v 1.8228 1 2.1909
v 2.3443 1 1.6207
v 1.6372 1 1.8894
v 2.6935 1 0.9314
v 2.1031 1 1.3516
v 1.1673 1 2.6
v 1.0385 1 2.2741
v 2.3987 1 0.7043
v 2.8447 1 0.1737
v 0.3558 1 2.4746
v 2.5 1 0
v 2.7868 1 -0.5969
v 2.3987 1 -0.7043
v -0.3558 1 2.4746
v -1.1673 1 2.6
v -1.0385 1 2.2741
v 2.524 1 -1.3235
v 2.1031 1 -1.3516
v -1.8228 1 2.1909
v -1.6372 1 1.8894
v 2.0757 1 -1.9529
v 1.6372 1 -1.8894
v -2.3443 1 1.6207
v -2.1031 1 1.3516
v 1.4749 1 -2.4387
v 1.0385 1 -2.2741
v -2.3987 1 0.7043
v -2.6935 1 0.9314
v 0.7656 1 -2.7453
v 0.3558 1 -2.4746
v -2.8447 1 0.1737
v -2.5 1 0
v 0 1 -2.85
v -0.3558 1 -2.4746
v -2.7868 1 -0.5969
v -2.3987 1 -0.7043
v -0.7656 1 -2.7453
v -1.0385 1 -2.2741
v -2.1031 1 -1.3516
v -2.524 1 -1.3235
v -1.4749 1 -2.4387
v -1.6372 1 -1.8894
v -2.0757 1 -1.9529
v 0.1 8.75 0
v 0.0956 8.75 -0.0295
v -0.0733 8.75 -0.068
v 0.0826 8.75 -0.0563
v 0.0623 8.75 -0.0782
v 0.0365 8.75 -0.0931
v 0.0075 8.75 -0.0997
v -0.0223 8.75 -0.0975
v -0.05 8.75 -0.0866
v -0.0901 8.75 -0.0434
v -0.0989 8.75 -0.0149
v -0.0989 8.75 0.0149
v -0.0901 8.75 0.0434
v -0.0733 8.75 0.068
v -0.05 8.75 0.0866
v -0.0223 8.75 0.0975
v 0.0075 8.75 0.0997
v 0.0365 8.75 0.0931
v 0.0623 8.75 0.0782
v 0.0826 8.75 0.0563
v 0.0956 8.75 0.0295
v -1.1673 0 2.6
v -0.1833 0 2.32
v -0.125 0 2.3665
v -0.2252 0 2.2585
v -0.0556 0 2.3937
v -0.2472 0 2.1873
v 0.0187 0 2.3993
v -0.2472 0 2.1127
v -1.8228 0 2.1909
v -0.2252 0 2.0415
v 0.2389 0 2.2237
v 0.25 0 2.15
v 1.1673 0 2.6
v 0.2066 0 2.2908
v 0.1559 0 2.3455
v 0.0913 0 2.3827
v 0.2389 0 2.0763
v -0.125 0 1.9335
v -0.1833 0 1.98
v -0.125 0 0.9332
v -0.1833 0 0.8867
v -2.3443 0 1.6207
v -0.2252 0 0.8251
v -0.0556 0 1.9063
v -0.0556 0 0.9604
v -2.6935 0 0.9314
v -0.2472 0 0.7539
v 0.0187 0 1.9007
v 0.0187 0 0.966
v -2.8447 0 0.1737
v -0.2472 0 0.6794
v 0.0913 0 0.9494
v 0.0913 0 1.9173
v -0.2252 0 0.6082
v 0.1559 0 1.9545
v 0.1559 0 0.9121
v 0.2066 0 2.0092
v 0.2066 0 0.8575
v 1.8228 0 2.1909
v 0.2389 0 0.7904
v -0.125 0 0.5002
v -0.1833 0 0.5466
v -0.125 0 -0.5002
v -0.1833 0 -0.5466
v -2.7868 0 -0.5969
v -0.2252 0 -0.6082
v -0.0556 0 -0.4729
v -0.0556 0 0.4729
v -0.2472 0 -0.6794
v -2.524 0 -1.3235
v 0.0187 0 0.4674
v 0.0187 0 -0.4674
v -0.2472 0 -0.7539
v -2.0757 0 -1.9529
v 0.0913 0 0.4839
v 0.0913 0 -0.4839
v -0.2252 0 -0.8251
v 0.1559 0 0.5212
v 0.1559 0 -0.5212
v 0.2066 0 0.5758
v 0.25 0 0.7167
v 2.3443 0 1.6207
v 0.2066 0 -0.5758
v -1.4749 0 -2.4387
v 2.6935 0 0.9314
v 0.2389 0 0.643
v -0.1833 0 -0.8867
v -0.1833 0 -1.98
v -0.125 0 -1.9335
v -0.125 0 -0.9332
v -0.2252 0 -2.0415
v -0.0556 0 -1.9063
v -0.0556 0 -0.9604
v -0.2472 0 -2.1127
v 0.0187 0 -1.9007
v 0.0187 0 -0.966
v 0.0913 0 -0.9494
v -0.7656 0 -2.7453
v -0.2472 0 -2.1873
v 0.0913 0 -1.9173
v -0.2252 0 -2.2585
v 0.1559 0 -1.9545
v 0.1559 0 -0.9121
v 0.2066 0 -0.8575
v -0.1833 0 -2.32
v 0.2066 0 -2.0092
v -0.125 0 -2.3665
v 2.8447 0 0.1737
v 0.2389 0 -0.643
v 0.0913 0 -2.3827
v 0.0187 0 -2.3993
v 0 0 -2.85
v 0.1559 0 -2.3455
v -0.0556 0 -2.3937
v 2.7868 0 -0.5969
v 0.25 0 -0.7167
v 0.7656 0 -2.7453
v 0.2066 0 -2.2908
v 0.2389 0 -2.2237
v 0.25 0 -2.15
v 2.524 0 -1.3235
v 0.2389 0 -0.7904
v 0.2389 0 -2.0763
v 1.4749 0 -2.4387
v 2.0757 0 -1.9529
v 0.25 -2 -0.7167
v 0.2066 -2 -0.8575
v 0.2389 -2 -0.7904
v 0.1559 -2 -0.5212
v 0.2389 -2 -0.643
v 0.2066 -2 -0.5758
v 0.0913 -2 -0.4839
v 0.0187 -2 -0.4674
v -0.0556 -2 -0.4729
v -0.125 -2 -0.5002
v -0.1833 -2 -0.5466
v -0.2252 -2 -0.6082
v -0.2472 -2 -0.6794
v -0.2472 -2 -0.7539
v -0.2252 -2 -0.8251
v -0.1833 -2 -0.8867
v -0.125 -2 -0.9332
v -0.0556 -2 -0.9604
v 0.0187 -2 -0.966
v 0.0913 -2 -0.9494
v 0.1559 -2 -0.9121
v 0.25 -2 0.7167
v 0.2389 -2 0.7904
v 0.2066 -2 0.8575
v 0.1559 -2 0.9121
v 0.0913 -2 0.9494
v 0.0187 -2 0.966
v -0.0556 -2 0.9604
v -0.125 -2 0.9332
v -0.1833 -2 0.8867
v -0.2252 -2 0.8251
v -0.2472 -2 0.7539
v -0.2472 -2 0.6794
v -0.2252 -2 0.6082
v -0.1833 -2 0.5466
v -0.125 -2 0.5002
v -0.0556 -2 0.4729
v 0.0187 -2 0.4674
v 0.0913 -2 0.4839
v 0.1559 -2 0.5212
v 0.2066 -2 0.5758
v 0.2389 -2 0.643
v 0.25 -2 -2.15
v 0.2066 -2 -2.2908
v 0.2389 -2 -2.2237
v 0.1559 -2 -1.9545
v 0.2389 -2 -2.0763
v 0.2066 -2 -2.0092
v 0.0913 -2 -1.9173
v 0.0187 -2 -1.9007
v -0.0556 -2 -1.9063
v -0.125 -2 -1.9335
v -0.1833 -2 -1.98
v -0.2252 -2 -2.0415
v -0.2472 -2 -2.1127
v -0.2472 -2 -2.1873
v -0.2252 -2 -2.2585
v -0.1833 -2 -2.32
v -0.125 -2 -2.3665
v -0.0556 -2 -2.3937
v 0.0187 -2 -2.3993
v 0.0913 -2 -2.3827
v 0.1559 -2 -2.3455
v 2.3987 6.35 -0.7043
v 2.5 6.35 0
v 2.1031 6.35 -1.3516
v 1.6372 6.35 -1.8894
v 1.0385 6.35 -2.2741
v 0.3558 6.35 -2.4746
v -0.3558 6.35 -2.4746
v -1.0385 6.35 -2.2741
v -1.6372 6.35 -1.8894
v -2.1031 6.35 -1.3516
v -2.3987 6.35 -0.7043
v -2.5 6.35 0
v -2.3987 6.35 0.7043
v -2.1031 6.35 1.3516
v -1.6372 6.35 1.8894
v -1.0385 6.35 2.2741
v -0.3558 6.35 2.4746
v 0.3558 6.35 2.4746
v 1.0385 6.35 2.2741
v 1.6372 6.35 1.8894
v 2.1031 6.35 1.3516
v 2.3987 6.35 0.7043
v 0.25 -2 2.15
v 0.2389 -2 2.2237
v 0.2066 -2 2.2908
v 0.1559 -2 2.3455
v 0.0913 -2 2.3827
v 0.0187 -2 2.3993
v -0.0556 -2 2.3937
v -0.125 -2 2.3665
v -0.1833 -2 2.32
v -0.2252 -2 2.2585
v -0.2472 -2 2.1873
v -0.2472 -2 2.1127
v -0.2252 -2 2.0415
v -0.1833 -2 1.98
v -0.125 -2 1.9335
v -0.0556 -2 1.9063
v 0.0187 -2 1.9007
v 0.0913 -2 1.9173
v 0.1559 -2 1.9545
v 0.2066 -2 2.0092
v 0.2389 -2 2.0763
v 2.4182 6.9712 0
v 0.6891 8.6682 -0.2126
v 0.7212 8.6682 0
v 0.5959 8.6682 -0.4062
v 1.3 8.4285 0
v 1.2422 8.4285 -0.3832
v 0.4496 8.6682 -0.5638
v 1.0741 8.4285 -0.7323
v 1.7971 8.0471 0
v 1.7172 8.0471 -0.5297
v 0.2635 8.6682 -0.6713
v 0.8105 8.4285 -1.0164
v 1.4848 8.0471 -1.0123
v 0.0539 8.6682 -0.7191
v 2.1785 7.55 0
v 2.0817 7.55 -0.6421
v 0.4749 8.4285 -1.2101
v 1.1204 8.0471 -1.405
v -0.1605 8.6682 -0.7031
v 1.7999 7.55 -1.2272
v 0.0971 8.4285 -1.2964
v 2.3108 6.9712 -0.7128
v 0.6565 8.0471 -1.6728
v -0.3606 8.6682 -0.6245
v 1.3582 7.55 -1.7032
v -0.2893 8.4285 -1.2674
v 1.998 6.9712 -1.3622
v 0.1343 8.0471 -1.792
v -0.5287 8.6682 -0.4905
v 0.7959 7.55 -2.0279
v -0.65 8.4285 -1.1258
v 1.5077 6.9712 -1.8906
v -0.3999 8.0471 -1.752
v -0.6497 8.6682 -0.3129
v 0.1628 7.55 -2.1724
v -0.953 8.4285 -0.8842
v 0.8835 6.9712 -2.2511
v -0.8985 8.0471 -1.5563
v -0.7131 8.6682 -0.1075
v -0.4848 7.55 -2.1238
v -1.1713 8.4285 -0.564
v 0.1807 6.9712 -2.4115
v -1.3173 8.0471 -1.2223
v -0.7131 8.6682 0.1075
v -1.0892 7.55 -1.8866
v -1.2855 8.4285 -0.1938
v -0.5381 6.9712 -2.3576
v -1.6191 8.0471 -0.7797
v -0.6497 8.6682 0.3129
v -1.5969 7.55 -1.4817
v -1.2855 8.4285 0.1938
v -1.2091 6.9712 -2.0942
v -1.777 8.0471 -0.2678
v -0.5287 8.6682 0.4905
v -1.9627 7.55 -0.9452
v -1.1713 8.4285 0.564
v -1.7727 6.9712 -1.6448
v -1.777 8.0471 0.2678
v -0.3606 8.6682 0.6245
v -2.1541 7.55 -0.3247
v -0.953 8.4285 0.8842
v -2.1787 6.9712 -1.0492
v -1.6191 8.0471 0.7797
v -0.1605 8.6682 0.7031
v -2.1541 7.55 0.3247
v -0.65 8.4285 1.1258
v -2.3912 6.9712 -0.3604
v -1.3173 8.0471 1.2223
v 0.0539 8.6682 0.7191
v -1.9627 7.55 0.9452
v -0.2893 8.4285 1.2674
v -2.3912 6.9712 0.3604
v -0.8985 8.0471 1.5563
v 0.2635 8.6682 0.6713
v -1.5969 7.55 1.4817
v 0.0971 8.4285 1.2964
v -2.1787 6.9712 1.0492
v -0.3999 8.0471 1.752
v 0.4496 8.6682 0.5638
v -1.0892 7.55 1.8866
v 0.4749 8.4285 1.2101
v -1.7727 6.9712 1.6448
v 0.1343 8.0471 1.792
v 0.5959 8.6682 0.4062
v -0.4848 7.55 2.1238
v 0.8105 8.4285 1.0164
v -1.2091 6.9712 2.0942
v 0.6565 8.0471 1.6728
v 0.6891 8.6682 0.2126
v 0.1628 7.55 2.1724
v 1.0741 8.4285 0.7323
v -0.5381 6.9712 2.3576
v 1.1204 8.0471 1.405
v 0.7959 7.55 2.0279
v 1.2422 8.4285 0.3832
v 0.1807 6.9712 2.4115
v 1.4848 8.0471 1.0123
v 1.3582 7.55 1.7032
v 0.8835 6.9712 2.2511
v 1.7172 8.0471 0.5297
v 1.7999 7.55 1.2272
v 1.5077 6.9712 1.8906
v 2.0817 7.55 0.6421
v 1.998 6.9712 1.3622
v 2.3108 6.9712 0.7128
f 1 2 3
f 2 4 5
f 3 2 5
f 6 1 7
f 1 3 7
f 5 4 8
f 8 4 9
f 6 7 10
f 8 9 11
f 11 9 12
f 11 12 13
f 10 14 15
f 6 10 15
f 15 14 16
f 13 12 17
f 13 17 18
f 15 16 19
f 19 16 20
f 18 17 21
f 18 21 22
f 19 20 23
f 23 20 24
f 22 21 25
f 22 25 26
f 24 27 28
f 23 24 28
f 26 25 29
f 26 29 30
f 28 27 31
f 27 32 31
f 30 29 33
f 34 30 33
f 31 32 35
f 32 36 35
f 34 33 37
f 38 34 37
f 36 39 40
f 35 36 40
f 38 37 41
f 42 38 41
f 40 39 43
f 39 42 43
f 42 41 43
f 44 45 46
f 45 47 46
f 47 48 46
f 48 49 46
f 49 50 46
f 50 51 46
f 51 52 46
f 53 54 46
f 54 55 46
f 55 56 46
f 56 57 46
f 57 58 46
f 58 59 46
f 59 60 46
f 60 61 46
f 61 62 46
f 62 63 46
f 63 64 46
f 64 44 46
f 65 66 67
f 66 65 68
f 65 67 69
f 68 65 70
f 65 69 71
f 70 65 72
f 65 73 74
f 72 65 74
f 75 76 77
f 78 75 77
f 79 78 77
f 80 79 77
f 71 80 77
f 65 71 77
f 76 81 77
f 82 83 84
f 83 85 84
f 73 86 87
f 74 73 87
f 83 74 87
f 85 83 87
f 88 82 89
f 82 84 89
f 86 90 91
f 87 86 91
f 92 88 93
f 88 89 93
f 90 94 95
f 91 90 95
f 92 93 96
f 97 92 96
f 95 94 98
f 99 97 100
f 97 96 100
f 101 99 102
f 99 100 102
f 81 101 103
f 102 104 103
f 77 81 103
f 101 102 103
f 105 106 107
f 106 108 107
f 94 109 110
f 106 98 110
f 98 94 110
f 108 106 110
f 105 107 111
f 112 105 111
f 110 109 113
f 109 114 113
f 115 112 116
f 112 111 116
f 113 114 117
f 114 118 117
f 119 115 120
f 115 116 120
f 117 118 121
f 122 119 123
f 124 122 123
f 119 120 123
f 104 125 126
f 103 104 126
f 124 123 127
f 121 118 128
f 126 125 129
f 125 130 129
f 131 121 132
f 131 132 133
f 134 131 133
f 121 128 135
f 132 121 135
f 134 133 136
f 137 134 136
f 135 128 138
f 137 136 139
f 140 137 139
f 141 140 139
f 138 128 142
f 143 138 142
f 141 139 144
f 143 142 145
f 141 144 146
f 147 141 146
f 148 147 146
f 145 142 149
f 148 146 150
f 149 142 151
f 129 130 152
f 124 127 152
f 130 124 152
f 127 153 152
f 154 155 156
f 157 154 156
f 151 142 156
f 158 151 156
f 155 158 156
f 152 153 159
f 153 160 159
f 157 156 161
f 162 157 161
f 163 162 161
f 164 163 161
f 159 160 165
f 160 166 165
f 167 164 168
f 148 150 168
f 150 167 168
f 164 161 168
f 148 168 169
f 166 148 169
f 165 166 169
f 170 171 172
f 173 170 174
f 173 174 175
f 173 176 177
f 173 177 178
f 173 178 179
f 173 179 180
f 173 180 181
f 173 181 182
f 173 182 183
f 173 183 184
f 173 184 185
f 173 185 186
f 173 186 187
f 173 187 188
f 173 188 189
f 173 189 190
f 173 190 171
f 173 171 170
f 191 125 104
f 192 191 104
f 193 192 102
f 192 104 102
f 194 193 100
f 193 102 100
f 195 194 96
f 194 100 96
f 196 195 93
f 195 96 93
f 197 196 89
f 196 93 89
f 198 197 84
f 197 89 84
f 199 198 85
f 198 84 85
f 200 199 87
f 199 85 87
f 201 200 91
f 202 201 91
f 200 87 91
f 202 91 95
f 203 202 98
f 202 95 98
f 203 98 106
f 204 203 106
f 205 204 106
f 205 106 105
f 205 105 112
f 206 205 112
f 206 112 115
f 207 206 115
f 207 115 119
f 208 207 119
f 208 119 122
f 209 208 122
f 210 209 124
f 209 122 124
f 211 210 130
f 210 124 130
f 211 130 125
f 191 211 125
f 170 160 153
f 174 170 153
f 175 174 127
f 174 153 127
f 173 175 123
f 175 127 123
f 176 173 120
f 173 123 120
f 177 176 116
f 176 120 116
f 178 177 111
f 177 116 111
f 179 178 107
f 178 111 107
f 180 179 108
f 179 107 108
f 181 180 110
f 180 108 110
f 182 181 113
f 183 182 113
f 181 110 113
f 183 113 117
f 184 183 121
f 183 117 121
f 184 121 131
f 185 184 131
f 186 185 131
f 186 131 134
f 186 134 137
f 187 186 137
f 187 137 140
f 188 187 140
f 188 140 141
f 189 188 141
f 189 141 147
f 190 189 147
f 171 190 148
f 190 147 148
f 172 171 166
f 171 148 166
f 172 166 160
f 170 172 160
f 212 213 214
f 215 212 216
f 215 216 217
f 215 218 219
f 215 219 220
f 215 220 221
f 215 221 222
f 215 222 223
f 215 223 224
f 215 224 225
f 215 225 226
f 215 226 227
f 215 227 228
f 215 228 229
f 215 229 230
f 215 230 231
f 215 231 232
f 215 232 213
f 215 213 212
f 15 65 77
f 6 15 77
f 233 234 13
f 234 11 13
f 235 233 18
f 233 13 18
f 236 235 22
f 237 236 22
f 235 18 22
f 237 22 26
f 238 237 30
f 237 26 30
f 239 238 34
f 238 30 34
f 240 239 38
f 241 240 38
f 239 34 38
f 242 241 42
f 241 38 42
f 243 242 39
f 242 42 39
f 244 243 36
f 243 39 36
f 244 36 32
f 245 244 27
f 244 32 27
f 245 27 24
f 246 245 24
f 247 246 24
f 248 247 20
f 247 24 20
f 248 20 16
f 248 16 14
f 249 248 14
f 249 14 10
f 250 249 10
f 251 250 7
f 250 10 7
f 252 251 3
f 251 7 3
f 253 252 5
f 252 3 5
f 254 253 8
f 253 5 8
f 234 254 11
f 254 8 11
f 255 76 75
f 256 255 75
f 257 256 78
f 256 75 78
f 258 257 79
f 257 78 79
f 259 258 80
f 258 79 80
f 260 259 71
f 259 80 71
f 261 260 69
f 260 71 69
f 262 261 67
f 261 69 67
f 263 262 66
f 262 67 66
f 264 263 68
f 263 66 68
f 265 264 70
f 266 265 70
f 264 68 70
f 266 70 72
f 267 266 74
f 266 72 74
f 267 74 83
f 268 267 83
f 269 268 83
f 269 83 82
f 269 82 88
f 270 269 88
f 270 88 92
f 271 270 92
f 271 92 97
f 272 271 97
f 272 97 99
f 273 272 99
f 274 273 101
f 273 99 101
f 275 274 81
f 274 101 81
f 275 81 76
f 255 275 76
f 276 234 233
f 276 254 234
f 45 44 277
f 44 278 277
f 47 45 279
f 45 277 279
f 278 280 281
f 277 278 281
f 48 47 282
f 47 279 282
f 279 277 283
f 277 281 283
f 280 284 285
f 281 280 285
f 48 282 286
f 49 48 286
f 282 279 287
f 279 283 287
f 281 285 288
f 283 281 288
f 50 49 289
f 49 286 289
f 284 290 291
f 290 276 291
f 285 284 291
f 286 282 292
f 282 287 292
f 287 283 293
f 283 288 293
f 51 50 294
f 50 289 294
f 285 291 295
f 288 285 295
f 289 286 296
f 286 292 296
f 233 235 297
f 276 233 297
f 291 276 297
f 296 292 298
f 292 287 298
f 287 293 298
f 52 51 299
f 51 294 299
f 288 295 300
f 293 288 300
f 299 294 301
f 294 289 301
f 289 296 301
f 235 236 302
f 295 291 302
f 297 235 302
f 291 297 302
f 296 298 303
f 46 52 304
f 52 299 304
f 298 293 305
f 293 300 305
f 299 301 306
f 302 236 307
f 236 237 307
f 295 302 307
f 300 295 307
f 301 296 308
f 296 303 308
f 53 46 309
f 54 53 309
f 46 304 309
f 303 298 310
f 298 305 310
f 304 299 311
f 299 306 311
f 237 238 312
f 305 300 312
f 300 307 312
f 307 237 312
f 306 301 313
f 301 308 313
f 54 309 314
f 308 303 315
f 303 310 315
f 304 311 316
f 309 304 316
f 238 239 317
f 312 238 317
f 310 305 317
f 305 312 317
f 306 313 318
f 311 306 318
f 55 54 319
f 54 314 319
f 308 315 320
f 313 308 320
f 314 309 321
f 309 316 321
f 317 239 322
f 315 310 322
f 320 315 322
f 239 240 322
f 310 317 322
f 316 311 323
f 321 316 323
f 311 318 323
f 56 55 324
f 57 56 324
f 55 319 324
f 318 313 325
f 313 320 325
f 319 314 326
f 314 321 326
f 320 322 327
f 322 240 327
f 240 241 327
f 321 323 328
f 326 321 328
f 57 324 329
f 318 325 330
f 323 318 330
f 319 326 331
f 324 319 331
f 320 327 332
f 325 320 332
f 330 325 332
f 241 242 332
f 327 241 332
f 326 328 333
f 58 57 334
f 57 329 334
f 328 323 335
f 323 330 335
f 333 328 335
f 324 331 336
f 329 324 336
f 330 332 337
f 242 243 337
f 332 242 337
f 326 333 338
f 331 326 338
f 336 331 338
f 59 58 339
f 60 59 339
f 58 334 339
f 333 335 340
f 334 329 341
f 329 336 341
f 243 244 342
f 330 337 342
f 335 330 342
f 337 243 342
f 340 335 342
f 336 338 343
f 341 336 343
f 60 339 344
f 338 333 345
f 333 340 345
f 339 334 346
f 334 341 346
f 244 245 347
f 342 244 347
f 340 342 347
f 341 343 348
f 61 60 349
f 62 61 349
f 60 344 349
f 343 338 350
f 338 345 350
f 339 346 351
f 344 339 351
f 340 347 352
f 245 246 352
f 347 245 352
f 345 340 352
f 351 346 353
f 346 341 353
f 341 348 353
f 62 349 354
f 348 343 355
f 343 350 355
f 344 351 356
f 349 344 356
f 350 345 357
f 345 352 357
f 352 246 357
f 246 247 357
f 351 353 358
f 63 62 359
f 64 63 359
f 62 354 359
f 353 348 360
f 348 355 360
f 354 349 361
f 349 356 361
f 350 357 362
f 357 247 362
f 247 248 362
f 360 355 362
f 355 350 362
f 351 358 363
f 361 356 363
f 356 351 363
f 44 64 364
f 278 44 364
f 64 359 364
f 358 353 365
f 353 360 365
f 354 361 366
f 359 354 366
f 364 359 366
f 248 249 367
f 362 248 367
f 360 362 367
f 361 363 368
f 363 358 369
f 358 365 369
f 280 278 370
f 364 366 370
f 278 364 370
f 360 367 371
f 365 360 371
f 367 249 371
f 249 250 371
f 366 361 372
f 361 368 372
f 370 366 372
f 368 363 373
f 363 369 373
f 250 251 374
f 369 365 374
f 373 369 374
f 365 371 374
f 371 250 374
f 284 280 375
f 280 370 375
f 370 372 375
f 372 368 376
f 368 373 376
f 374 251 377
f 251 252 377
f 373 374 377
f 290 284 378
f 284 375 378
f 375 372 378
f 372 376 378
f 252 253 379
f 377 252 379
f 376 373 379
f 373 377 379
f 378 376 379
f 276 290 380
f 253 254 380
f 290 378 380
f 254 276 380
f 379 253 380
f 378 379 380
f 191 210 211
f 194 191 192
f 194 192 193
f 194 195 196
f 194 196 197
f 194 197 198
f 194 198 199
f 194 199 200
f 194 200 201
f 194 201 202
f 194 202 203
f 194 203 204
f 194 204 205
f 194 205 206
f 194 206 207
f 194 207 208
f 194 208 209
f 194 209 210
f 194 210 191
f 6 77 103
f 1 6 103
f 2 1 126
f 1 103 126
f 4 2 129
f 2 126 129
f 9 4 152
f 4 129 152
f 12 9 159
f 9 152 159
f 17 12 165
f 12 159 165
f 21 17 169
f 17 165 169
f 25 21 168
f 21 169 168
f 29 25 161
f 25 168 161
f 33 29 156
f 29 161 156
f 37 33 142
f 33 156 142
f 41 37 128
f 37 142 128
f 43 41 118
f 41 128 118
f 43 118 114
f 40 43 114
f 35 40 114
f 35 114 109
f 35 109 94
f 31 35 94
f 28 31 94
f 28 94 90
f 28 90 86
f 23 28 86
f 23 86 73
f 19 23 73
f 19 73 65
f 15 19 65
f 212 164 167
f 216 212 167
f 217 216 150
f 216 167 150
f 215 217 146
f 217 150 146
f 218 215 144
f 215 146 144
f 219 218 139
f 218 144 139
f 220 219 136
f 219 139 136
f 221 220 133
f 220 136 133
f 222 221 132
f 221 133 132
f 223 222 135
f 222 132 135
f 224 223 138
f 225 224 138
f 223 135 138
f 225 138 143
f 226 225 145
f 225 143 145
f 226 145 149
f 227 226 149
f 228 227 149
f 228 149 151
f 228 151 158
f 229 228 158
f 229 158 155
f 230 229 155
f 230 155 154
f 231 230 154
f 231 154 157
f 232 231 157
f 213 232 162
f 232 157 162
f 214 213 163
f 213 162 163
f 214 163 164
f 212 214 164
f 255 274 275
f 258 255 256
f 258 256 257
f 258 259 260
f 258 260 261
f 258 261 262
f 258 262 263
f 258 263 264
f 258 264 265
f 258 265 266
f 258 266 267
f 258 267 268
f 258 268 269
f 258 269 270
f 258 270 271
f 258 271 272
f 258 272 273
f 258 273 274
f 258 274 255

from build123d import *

# Parameters (mm, degrees)
CUT_EXTRUDE1_DEPTH  = 1
SKETCH3_R           = 0.25
BOSS_EXTRUDE1_DEPTH = 2


with BuildPart() as part:
    # Sketch1 → Revolve1 (revolve)
    with BuildSketch(Plane.XY):
        with BuildLine():
            Line((0, 0), (0, 8.75))
            Line((0, 8.75), (0.1, 8.75))
            ThreePointArc((0.1, 8.75), (1.797056275, 8.047056275), (2.5, 6.35))
            Line((2.5, 6.35), (2.5, 1))
            Line((2.5, 1), (2.85, 1))
            Line((2.85, 1), (2.85, 0))
            Line((2.85, 0), (0, 0))
        make_face()
    revolve(axis=Axis((0, 0, 0), (0, 1, 0)))

    # Sketch2 → Cut-Extrude1 (cut)
    with BuildSketch(Plane.XZ):
        with BuildLine():
            Line((-1.167261753, 2.6), (1.167261753, 2.6))
            ThreePointArc((1.167261753, 2.6), (0, 2.85), (-1.167261753, 2.6))
        make_face()
    extrude(amount=-CUT_EXTRUDE1_DEPTH, mode=Mode.SUBTRACT)

    # Sketch3 → Boss-Extrude1 (add)
    with BuildSketch(Plane.XZ):
        with Locations((0, -2.15)):
            Circle(SKETCH3_R)
        with Locations((0, 2.15)):
            Circle(SKETCH3_R)
        with Locations((0, -0.716666667)):
            Circle(SKETCH3_R)
        with Locations((0, 0.716666667)):
            Circle(SKETCH3_R)
    extrude(amount=BOSS_EXTRUDE1_DEPTH)


solid = part.part
